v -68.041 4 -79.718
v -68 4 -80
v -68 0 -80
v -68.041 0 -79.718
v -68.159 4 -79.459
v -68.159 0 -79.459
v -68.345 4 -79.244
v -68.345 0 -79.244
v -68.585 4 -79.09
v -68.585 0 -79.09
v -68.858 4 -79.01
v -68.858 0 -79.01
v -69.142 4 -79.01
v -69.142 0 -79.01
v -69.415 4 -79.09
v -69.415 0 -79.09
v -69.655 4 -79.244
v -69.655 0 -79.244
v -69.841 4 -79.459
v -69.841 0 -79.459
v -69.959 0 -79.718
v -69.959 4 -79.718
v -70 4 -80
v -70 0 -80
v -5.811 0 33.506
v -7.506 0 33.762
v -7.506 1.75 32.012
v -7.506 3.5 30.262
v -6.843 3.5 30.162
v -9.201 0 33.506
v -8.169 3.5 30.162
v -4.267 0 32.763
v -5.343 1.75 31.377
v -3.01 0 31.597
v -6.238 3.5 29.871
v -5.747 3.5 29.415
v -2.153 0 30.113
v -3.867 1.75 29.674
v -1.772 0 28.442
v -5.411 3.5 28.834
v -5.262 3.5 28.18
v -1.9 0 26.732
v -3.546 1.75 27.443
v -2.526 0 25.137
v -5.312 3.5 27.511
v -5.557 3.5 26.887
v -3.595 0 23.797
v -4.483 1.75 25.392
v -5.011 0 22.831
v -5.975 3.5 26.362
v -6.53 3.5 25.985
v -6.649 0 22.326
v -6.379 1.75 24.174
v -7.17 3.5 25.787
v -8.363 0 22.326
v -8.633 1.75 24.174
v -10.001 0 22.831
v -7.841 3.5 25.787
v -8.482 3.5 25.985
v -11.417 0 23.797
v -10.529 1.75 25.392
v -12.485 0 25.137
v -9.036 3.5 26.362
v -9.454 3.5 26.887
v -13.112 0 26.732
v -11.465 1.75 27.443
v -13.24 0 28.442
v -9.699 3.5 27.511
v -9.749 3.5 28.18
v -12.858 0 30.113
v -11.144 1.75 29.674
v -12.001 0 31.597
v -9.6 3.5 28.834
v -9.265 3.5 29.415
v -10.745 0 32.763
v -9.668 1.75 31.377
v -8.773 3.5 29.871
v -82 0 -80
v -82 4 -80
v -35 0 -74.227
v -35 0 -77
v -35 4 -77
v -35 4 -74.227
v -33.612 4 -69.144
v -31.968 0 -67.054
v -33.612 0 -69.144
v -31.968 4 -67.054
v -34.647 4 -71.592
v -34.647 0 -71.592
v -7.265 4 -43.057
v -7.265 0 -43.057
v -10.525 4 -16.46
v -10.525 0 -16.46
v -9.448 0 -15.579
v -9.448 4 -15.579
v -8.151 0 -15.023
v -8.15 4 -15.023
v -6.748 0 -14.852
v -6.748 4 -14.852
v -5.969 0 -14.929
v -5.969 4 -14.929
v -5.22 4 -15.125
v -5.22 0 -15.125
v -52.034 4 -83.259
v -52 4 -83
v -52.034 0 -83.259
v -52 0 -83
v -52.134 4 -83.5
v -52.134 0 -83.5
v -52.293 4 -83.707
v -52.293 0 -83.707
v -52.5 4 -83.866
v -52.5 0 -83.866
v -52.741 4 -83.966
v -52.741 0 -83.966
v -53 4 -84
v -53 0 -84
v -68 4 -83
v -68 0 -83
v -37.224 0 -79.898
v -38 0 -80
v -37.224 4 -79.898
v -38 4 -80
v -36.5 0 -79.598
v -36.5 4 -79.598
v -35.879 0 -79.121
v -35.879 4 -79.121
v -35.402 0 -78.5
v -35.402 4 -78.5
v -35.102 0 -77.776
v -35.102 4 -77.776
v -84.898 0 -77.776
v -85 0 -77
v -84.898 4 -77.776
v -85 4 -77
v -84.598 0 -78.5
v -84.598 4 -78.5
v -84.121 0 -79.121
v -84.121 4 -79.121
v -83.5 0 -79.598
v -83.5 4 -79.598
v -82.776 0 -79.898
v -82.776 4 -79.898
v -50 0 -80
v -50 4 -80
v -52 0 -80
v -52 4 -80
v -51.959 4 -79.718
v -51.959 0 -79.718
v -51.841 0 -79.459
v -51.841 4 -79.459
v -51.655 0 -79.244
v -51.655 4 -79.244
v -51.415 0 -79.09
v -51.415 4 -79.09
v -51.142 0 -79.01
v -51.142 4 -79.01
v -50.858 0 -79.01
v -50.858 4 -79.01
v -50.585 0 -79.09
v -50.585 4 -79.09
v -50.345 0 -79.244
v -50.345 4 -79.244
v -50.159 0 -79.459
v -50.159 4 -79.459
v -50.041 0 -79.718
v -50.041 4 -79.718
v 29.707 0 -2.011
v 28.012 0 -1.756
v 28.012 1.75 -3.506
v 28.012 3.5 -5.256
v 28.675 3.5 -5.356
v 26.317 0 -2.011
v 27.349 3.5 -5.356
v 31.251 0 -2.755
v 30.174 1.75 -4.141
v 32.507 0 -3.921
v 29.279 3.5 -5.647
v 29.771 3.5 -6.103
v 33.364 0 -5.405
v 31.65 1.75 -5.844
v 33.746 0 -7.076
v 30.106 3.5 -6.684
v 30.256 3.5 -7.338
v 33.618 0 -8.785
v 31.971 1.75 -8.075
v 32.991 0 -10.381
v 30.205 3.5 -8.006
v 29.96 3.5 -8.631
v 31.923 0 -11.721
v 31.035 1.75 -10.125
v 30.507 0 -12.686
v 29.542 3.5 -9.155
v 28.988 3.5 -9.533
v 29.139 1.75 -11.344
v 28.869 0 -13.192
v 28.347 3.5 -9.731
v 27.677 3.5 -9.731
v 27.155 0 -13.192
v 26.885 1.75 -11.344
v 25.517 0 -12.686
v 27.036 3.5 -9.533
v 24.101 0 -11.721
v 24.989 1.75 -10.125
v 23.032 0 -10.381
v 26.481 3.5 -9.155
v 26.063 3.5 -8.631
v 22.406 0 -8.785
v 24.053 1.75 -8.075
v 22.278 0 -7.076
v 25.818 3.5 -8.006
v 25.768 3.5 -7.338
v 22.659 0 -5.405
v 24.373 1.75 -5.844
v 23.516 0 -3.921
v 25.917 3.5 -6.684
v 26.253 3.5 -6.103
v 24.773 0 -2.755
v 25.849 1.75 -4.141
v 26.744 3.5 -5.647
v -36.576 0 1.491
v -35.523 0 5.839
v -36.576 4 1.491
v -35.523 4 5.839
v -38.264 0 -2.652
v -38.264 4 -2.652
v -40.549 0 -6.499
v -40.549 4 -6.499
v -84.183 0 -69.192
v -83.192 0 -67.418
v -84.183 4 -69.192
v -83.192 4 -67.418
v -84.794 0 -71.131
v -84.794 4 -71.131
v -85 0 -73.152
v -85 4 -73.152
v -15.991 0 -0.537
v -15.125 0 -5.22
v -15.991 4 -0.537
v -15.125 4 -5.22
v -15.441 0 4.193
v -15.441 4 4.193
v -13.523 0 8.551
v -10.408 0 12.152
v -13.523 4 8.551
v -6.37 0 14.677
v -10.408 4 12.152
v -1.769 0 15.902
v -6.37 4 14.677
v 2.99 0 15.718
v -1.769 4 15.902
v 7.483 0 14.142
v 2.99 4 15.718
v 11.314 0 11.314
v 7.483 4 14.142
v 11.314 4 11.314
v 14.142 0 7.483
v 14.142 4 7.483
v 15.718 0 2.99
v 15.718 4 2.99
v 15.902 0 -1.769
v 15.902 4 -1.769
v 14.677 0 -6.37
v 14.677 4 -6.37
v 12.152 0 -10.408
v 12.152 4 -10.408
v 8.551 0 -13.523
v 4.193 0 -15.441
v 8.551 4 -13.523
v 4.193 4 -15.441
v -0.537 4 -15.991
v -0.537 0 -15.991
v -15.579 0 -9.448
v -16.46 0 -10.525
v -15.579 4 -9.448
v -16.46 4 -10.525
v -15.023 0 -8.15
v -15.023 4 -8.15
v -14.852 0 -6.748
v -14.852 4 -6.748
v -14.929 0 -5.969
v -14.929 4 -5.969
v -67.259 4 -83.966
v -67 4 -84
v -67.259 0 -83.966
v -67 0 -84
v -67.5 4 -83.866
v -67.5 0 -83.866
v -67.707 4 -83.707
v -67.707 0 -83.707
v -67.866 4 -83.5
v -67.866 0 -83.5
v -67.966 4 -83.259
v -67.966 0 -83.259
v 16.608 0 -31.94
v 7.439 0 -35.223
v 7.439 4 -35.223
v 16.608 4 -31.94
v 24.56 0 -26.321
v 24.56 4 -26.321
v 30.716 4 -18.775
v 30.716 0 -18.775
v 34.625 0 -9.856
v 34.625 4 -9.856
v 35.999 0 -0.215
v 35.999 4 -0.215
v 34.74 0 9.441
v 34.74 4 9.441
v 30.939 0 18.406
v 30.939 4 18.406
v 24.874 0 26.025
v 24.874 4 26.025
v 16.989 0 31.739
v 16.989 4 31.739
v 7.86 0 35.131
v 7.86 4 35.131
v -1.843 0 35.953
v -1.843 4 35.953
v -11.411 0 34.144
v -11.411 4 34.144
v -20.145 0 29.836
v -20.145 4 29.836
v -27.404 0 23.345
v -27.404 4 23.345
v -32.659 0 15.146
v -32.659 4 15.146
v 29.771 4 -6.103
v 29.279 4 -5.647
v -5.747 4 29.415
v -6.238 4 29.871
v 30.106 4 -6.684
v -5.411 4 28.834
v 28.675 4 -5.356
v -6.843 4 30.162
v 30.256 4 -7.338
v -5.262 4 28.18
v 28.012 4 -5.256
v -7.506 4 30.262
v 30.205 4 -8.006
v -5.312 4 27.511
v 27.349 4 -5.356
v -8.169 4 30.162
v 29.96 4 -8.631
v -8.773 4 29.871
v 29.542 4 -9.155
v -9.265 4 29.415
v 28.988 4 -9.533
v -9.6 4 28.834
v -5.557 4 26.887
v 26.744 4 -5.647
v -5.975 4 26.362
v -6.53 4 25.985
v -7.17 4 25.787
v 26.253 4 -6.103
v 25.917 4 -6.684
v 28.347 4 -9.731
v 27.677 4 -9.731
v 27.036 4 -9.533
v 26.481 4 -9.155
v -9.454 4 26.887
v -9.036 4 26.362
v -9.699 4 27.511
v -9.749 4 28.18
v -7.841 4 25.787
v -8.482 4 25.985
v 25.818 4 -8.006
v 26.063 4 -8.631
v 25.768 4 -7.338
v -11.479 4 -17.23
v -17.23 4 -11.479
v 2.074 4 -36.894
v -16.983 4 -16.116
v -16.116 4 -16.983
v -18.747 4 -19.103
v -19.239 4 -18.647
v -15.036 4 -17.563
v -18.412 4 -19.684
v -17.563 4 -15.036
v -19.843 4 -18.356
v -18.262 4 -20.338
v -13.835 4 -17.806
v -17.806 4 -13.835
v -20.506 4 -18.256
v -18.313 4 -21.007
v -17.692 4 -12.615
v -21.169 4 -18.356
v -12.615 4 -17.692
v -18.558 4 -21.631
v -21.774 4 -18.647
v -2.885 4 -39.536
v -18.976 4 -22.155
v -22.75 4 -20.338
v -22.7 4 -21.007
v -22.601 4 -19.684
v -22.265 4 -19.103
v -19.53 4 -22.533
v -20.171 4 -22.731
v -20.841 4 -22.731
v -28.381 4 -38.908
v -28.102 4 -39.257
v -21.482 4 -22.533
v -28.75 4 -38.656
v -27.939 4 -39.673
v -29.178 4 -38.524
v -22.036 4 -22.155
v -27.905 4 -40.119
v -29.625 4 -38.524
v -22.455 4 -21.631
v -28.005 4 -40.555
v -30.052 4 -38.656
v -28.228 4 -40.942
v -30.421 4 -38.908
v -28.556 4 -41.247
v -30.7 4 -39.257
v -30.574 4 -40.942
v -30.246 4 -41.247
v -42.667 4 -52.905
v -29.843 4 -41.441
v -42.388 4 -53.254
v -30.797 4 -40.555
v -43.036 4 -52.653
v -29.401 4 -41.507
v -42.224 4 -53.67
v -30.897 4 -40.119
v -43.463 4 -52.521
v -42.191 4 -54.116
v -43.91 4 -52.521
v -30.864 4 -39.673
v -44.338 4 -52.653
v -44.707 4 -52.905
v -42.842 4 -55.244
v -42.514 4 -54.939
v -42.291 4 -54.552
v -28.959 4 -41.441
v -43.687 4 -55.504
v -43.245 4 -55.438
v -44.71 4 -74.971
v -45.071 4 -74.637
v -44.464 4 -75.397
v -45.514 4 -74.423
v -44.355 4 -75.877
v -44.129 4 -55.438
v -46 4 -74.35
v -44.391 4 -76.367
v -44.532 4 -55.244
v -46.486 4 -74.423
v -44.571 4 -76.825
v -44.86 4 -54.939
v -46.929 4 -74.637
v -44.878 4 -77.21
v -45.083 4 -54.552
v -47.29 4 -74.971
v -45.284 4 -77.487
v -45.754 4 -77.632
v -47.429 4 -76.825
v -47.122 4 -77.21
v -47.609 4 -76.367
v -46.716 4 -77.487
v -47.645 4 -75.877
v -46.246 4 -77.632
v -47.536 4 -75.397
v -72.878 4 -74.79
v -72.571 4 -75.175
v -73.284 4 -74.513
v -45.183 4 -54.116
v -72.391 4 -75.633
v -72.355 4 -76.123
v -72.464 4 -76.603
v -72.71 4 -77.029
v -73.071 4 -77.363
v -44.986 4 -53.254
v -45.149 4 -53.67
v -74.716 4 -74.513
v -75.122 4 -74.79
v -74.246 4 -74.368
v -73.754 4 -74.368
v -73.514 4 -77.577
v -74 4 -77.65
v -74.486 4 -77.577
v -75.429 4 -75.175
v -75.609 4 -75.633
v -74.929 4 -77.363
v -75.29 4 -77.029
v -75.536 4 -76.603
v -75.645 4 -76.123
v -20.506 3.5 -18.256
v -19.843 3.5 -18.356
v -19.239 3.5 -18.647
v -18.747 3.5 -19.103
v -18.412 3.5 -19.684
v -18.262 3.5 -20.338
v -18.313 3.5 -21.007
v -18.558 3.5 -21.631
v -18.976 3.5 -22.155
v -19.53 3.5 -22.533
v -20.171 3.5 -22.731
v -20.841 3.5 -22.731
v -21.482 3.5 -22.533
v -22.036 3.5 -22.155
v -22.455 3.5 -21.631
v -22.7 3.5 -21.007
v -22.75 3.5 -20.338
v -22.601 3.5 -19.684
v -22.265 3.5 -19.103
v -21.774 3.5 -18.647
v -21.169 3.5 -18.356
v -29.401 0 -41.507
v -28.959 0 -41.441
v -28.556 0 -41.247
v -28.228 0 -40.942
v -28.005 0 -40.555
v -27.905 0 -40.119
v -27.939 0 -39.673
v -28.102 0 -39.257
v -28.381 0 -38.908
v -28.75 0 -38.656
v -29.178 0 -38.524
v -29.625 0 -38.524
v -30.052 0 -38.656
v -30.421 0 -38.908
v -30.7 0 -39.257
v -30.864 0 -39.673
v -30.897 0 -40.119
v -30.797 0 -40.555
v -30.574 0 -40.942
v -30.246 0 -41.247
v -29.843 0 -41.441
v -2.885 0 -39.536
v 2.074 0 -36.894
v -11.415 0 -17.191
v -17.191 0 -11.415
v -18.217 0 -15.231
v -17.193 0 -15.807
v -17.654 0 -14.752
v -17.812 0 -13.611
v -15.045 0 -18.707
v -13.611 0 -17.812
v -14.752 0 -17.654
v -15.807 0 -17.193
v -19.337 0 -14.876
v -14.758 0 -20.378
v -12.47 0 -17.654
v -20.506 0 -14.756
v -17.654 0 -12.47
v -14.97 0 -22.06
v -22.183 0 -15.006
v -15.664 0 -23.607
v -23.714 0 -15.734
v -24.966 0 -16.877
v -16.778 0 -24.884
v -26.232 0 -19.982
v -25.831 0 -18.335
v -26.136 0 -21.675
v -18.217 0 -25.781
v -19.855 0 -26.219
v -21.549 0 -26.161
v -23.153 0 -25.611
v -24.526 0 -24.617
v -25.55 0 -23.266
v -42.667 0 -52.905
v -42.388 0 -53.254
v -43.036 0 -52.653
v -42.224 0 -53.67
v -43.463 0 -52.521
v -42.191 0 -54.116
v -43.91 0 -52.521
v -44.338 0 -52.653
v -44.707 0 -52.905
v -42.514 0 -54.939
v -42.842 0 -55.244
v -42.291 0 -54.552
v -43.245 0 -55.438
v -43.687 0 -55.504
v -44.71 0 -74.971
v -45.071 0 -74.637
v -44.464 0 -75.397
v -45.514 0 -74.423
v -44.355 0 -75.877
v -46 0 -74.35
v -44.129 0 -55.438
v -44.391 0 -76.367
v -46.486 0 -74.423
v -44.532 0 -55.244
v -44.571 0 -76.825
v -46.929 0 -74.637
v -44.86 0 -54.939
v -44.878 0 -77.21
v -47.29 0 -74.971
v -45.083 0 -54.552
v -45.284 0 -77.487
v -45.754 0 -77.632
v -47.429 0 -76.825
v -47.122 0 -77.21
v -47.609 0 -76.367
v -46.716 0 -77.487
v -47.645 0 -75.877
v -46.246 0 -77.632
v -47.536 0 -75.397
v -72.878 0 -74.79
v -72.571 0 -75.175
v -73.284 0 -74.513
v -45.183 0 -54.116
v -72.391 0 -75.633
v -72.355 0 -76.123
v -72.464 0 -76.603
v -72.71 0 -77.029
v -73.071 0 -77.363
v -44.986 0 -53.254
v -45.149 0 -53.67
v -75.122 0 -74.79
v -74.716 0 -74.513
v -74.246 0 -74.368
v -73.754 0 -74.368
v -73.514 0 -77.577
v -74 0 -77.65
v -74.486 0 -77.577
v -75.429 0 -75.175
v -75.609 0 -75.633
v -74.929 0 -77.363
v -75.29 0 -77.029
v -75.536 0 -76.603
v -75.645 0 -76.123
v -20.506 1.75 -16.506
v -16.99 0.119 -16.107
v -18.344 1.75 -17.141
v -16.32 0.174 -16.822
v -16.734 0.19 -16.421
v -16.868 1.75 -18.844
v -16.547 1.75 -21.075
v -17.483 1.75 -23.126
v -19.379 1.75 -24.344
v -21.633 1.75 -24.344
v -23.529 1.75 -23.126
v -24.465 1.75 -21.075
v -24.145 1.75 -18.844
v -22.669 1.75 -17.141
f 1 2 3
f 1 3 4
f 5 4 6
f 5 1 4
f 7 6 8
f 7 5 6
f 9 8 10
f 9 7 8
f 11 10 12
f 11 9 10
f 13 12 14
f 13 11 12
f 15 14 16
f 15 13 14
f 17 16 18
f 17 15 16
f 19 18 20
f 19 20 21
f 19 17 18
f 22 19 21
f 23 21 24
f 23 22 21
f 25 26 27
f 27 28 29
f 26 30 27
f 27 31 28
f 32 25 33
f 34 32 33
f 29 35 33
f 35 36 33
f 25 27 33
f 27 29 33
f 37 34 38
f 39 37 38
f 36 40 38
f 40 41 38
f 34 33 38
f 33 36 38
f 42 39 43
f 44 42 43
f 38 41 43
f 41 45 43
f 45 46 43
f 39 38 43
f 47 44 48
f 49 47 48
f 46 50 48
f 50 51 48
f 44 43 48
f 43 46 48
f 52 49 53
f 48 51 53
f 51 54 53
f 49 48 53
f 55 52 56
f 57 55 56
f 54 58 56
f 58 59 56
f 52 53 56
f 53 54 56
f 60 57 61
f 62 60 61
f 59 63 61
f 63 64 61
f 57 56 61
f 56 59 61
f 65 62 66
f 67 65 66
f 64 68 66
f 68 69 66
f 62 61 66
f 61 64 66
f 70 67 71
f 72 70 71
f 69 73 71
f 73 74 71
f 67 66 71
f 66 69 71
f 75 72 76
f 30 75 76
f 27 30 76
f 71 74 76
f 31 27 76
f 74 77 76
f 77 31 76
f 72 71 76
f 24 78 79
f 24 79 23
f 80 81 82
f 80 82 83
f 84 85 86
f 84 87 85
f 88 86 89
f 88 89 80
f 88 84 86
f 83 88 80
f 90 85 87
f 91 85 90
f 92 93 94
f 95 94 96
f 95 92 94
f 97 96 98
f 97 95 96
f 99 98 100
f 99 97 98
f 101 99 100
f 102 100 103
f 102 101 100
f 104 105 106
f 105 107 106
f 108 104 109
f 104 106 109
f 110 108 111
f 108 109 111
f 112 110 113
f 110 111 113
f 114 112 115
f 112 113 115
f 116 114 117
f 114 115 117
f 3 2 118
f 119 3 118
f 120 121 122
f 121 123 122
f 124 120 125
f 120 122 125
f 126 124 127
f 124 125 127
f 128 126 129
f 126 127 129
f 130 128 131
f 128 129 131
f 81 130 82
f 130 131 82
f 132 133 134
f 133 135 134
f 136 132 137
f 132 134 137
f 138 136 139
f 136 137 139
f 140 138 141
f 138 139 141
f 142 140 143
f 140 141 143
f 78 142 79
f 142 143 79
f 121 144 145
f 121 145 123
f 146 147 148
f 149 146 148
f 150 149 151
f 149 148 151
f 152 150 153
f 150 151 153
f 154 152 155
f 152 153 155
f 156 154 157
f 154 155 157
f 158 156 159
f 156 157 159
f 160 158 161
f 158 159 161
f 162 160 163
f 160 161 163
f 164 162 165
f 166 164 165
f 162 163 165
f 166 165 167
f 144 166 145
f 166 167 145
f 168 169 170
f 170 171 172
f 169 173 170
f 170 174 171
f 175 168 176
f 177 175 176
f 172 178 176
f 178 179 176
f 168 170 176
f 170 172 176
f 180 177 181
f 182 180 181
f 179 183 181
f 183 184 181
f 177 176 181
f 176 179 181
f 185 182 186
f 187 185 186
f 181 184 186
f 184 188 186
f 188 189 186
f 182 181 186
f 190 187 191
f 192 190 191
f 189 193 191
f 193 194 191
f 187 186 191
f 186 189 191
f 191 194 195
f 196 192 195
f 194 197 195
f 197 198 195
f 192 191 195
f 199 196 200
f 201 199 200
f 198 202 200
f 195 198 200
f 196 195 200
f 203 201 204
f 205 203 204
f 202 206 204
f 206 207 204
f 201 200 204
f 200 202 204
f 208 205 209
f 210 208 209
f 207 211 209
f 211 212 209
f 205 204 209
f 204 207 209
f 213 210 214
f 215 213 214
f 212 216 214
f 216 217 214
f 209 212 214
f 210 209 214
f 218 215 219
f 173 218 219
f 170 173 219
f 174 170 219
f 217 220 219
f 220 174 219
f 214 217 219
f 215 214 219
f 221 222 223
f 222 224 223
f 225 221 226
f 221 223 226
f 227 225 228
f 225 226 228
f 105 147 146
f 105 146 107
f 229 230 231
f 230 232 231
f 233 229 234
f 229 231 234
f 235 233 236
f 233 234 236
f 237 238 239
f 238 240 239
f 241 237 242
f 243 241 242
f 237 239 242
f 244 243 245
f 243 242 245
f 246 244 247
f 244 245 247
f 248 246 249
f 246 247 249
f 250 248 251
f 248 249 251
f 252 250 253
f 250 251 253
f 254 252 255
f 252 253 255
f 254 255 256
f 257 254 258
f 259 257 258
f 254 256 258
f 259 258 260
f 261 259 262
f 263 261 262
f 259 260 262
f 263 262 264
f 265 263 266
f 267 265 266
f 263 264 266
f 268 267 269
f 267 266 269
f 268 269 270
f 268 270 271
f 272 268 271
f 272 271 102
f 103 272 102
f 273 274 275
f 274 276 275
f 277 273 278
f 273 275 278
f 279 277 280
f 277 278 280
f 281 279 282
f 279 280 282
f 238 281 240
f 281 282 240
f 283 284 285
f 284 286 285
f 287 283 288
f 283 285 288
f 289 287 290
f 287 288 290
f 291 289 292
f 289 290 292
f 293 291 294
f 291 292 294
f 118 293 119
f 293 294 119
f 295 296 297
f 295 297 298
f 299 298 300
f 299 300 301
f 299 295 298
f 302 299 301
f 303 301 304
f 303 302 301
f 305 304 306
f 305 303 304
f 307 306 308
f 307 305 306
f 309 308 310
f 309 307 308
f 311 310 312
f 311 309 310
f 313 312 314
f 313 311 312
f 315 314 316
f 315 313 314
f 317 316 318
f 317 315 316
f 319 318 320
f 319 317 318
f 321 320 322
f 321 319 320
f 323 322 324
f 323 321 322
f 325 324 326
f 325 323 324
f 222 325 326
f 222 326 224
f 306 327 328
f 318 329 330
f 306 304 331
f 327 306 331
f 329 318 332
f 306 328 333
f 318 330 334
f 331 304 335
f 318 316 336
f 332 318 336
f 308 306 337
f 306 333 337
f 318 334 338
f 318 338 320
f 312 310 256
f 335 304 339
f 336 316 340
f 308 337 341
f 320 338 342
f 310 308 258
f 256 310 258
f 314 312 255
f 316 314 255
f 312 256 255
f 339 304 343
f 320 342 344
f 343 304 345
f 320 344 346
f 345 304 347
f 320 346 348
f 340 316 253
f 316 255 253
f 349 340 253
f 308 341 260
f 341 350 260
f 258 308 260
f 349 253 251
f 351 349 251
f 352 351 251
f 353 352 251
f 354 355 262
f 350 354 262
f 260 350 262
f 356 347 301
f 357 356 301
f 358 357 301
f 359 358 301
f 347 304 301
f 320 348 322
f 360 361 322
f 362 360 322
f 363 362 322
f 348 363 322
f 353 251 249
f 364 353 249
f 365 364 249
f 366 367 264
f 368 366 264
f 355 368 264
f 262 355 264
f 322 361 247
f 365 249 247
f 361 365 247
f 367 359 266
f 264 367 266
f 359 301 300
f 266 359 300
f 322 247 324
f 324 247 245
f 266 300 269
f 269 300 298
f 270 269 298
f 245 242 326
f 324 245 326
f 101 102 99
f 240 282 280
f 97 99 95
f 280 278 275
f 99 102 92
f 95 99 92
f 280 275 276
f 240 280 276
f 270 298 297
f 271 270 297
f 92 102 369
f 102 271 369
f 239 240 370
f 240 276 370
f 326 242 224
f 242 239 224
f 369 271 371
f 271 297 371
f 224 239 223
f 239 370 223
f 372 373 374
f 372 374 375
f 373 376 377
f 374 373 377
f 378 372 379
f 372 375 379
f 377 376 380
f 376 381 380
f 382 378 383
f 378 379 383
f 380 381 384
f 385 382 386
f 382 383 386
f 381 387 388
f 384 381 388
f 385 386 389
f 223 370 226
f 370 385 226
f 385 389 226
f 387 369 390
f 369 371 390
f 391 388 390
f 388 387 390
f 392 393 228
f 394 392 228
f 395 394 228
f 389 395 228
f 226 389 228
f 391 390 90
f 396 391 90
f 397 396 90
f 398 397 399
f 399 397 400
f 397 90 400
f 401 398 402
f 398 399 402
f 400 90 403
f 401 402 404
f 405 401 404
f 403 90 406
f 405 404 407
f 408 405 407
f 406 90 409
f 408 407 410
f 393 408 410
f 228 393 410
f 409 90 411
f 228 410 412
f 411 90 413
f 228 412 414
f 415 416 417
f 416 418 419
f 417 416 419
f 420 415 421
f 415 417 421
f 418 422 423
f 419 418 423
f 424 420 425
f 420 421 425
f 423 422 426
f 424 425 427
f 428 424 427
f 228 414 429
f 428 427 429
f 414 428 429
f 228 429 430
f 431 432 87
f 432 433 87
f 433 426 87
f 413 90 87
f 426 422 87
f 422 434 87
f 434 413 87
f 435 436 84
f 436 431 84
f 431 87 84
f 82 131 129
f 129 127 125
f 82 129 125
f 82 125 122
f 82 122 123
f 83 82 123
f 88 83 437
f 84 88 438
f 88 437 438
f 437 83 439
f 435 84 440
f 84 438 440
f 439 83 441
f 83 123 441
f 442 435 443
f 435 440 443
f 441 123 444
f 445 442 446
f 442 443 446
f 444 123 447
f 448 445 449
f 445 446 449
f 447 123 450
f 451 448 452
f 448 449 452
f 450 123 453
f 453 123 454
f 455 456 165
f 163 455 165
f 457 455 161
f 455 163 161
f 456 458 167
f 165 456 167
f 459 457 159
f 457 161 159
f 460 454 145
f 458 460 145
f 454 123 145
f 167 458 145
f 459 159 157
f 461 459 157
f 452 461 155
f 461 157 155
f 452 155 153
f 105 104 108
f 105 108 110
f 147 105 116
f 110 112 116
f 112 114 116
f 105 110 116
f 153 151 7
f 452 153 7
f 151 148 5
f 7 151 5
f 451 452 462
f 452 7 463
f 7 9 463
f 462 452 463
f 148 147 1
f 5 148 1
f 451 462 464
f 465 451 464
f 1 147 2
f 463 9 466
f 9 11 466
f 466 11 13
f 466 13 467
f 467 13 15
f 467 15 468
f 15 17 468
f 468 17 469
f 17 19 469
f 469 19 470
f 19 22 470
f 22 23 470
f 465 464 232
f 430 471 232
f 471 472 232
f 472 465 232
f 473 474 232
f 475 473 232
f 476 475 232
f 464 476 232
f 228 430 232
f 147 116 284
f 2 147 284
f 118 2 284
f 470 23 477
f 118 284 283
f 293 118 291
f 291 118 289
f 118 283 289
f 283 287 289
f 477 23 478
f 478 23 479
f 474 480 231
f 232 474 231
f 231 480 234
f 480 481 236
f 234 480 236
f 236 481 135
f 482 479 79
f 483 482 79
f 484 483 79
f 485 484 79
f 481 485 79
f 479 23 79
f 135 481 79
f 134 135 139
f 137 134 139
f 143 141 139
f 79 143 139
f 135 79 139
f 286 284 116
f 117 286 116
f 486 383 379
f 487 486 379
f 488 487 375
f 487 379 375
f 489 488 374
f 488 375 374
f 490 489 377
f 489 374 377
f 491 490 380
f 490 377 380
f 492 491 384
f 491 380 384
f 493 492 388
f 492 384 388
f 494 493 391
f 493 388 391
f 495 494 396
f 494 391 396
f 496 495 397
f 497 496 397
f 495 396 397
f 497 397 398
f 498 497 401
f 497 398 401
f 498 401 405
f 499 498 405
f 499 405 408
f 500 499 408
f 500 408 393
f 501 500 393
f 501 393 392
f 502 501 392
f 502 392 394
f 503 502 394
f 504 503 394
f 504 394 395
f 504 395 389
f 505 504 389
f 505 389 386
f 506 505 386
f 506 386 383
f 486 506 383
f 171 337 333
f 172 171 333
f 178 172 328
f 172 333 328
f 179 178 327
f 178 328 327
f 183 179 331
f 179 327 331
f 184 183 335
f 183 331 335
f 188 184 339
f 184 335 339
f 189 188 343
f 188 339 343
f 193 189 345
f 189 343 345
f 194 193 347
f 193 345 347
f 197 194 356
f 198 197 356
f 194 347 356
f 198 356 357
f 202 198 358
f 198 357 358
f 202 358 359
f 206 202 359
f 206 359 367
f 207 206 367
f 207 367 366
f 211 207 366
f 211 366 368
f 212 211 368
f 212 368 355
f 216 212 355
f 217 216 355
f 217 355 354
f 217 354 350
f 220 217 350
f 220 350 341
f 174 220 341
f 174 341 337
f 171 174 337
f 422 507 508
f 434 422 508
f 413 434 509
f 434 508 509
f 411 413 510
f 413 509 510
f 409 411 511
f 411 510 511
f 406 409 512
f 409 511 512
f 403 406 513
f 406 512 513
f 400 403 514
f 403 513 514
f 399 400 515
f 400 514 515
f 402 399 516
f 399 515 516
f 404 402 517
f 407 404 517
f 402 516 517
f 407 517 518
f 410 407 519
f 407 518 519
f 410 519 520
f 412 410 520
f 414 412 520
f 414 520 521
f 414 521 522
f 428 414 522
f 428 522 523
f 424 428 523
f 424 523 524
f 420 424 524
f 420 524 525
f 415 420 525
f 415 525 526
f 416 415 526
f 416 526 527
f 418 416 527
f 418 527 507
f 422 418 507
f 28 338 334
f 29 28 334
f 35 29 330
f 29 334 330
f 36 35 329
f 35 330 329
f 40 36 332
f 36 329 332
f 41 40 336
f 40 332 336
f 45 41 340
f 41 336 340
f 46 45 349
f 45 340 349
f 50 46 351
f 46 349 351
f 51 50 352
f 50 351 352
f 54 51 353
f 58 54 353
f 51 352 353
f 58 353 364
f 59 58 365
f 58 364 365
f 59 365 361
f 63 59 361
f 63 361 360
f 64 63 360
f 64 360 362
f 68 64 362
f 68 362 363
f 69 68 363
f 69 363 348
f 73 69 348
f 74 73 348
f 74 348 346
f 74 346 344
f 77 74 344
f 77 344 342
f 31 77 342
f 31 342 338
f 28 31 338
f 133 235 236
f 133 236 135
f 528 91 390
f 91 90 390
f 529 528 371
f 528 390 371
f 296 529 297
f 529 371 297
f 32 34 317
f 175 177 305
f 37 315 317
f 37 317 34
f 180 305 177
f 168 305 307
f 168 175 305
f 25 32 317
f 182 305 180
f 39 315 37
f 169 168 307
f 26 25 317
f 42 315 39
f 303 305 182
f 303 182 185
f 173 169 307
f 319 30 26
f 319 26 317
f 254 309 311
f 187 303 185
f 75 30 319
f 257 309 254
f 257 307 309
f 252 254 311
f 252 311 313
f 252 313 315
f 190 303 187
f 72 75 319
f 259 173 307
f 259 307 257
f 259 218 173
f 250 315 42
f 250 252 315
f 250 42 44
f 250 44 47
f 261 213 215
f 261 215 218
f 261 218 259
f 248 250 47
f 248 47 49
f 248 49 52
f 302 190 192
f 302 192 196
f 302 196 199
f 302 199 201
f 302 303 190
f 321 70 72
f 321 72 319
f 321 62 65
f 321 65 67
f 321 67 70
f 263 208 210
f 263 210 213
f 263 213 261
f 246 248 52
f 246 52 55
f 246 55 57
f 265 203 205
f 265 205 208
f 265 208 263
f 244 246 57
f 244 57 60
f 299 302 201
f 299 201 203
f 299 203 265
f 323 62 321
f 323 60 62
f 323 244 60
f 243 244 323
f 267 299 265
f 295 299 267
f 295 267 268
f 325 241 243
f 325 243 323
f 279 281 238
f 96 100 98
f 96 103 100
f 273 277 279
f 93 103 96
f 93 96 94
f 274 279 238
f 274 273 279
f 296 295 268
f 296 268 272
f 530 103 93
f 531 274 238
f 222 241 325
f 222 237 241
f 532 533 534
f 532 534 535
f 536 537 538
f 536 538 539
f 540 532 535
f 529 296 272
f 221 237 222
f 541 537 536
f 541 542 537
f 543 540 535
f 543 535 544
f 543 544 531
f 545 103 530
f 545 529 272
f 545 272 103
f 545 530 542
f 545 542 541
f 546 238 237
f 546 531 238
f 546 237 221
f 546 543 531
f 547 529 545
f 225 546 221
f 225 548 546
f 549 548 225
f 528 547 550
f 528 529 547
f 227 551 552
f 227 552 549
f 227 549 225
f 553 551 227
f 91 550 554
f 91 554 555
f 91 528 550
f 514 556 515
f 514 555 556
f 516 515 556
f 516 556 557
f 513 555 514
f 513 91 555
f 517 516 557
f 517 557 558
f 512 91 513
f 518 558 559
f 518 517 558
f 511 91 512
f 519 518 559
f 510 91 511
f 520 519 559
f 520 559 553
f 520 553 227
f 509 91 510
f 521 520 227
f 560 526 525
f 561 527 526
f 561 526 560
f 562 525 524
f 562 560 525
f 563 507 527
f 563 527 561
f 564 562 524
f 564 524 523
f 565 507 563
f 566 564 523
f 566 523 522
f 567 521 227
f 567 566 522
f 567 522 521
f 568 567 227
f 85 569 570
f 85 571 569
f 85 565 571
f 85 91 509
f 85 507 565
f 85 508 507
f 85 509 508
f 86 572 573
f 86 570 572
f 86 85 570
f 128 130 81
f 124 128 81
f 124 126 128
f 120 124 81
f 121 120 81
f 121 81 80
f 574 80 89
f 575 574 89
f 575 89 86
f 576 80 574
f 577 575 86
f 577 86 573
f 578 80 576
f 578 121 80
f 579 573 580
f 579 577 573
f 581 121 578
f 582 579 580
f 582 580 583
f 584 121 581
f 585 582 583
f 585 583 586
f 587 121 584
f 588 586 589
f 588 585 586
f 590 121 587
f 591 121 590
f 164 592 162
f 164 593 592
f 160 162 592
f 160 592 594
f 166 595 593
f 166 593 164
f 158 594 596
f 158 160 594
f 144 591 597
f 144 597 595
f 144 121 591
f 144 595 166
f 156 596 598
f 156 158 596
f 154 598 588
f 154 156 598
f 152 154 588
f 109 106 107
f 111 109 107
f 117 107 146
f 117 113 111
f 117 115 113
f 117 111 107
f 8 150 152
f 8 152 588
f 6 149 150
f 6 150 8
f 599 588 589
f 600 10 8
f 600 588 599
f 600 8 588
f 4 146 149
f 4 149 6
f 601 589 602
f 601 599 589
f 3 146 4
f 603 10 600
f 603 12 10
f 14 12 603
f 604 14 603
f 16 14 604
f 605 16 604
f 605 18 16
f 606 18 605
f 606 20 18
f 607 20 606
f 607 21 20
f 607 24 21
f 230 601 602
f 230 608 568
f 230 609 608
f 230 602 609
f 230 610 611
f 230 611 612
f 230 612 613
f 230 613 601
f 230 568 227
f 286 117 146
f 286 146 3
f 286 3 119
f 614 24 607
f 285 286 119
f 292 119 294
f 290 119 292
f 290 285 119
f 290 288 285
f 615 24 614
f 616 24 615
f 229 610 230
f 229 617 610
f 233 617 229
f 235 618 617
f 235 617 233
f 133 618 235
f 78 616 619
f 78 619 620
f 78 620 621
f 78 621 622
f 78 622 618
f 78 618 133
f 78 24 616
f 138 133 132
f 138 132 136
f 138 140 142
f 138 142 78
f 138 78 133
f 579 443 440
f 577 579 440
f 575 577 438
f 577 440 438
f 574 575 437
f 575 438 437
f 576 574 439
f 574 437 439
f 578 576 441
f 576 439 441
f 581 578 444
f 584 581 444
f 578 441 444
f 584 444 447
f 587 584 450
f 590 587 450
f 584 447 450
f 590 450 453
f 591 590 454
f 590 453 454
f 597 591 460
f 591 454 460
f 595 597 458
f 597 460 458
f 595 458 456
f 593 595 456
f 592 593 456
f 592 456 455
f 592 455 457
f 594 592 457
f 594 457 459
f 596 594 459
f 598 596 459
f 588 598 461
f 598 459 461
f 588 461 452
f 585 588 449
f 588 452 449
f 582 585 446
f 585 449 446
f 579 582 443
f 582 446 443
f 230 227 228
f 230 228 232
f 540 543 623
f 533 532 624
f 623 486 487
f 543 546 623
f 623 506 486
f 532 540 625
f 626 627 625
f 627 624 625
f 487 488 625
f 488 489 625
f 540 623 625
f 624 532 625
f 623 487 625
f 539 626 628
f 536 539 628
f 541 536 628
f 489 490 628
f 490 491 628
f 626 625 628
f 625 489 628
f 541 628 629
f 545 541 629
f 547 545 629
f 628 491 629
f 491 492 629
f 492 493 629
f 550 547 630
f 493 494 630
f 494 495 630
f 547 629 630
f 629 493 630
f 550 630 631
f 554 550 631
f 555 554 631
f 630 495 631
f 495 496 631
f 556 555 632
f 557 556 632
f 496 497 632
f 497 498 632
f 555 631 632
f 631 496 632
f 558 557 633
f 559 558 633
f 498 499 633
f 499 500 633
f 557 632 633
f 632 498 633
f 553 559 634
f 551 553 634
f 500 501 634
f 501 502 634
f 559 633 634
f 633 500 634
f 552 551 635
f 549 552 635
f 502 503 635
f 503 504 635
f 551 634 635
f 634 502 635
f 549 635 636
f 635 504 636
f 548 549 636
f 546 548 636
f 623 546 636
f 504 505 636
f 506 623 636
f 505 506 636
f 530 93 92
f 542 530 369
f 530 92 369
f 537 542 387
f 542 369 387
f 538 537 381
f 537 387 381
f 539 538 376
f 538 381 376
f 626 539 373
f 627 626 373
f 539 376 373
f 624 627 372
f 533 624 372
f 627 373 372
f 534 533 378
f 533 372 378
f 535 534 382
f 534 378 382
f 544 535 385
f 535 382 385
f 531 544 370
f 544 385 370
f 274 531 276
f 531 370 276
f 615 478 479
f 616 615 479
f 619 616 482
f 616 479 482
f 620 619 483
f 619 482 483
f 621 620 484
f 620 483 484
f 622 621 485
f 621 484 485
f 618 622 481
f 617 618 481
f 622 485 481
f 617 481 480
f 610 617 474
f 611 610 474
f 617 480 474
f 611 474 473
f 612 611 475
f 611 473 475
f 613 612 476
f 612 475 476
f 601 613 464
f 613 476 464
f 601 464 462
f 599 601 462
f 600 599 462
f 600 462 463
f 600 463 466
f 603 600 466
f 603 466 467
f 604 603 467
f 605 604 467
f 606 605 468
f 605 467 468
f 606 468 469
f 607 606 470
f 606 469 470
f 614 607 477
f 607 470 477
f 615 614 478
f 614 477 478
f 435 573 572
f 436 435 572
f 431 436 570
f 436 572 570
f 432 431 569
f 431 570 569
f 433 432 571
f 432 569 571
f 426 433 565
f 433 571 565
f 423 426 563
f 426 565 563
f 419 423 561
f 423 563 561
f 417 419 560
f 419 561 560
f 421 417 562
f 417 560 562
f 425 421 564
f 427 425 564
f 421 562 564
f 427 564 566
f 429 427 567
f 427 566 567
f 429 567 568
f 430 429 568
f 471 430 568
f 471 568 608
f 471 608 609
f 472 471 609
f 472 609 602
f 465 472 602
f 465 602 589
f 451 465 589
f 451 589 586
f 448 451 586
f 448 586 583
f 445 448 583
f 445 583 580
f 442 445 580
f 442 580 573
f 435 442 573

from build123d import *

# Parameters (mm, degrees)
EXTRUDE_1_DEPTH     = 4
FILLET_1_R          = 30
FILLET_2_R          = 30
SKETCH_2_R          = 2.25
SKETCH_2_R_2        = 16
CUT_EXTRUDE_1_DEPTH = 4
SKETCH_3_R          = 4.2
CUT_EXTRUDE_2_DEPTH = 4
FILLET_3_R          = 5
SKETCH_4_R          = 1.65
CUT_EXTRUDE_3_DEPTH = 4
FILLET_4_R          = 10
FILLET_5_R          = 3
SKETCH_7_W          = 16
SKETCH_7_H          = 4
EXTRUDE_3_DEPTH     = 4
CUT_EXTRUDE_5_DEPTH = 4
FILLET_7_R          = 1
CHAMFER_1_SIZE      = 3.5
SKETCH_9_R          = 1.2
CUT_EXTRUDE_6_DEPTH = 10
SKETCH_10_R         = 1.5
CUT_EXTRUDE_7_DEPTH = 10


with BuildPart() as part:
    # 草图1 → 凸台-拉伸1 (new body)
    with BuildSketch(Plane(origin=(0, 0, 0), x_dir=(1, 0, 0), z_dir=(0, 1, 0))):
        with BuildLine():
            Line((-85, 80), (-35, 80))
            Line((-35, 80), (-35, 70))
            Line((-35, 70), (0, 36))
            ThreePointArc((0, 36), (25.455844123, -25.455844123), (-36, 0))
            Line((-36, 0), (-85, 70))
            Line((-85, 70), (-85, 80))
        make_face()
    extrude(amount=EXTRUDE_1_DEPTH)

    # 圆角1
    fillet_1_edges = [part.edges().sort_by_distance(p)[0] for p in [
        (0, 2, -36),
    ]]
    fillet(fillet_1_edges, radius=FILLET_1_R)

    # 圆角2
    fillet_2_edges = [part.edges().sort_by_distance(p)[0] for p in [
        (-36, 2, 0),
    ]]
    fillet(fillet_2_edges, radius=FILLET_2_R)

    # 草图2 → 切除-拉伸1 (cut)
    with BuildSketch(Plane(origin=(0, 4, 0), x_dir=(1, 0, 0), z_dir=(0, 1, 0))):
        with Locations(Location((-20.506096654, 20.506096654, 0), (0, 0, 270))):
            Circle(SKETCH_2_R)
        with Locations(Location((28.011848962, 7.505752308, 0), (0, 0, 270))):
            Circle(SKETCH_2_R)
        with Locations(Location((-7.505752308, -28.011848962, 0), (0, 0, 270))):
            Circle(SKETCH_2_R)
        with Locations(Location((0, 0, 0), (0, 0, 270))):
            Circle(SKETCH_2_R_2)
    extrude(amount=-CUT_EXTRUDE_1_DEPTH, mode=Mode.SUBTRACT)

    # 草图3 → 切除-拉伸2 (cut)
    with BuildSketch(Plane(origin=(0, 4, 0), x_dir=(1, 0, 0), z_dir=(0, 1, 0))):
        with Locations((-13.611805538, 13.611805538)):
            Circle(SKETCH_3_R)
    extrude(amount=-CUT_EXTRUDE_2_DEPTH, mode=Mode.SUBTRACT)

    # 圆角3
    fillet_3_edges = [part.edges().sort_by_distance(p)[0] for p in [
        (-9.473632004, 2, -12.893808462),
        (-12.893808462, 2, -9.473632004),
    ]]
    fillet(fillet_3_edges, radius=FILLET_3_R)

    # 草图4 → 切除-拉伸3 (cut)
    with BuildSketch(Plane(origin=(0, 4, 0), x_dir=(1, 0, 0), z_dir=(0, 1, 0))):
        with Locations(Location((-46, 76, 0), (0, 0, 270))):
            Circle(SKETCH_4_R)
        with Locations(Location((-74, 76, 0), (0, 0, 90))):
            Circle(SKETCH_4_R)
    extrude(amount=-CUT_EXTRUDE_3_DEPTH, mode=Mode.SUBTRACT)

    # 圆角4
    fillet_4_edges = [part.edges().sort_by_distance(p)[0] for p in [
        (-35, 2, -70),
        (-85, 2, -70),
    ]]
    fillet(fillet_4_edges, radius=FILLET_4_R)

    # 圆角5
    fillet_5_edges = [part.edges().sort_by_distance(p)[0] for p in [
        (-85, 2, -80),
        (-35, 2, -80),
    ]]
    fillet(fillet_5_edges, radius=FILLET_5_R)

    # 草图7 → 凸台-拉伸3 (add)
    with BuildSketch(Plane(origin=(0, 4, 0), x_dir=(1, 0, 0), z_dir=(0, 1, 0))):
        with Locations((-60, 82)):
            Rectangle(SKETCH_7_W, SKETCH_7_H)
    extrude(amount=-EXTRUDE_3_DEPTH)

    # 草图8 → 切除-拉伸5 (cut)
    with BuildSketch(Plane(origin=(0, 4, 0), x_dir=(1, 0, 0), z_dir=(0, 1, 0))):
        with BuildLine():
            Line((-50, 80), (-52, 80))
            ThreePointArc((-52, 80), (-51, 79), (-50, 80))
        make_face()
        with BuildLine():
            Line((-70, 80), (-68, 80))
            ThreePointArc((-68, 80), (-69, 79), (-70, 80))
        make_face()
    extrude(amount=-CUT_EXTRUDE_5_DEPTH, mode=Mode.SUBTRACT)

    # 圆角7
    fillet_7_edges = [part.edges().sort_by_distance(p)[0] for p in [
        (-52, 2, -84),
        (-68, 2, -84),
    ]]
    fillet(fillet_7_edges, radius=FILLET_7_R)

    # 倒角1
    # the kernel refuses this chamfer: 3.5 mm, written as the material it takes off along each edge
    with BuildSketch(Plane(origin=(-20.506096654, 0, -20.506096654), x_dir=(0, 0, 1), z_dir=(-1, 0, 0))) as chamfer_1_piece_1:
        Polygon((2.25 + CHAMFER_1_SIZE, 0), (2.25, CHAMFER_1_SIZE), (2.25, 0), align=None)
    revolve(axis=Axis((-20.506096654, 0, -20.506096654), (0, 1, 0)), mode=Mode.SUBTRACT)
    with BuildSketch(Plane(origin=(28.011848962, 0, -7.505752308), x_dir=(0, 0, 1), z_dir=(-1, 0, 0))) as chamfer_1_piece_2:
        Polygon((2.25 + CHAMFER_1_SIZE, 0), (2.25, CHAMFER_1_SIZE), (2.25, 0), align=None)
    revolve(axis=Axis((28.011848962, 0, -7.505752308), (0, 1, 0)), mode=Mode.SUBTRACT)
    with BuildSketch(Plane(origin=(-7.505752308, 0, 28.011848962), x_dir=(0, 0, 1), z_dir=(-1, 0, 0))) as chamfer_1_piece_3:
        Polygon((2.25 + CHAMFER_1_SIZE, 0), (2.25, CHAMFER_1_SIZE), (2.25, 0), align=None)
    revolve(axis=Axis((-7.505752308, 0, 28.011848962), (0, 1, 0)), mode=Mode.SUBTRACT)

    # 草图9 → 切除-拉伸6 (cut)
    with BuildSketch(Plane.XZ):
        with Locations(Location((-29.401166302, -40.007142113, 0), (0, 0, 270))):
            Circle(SKETCH_9_R)
        with Locations(Location((-43.686880588, -54.004226358, 0), (0, 0, 270))):
            Circle(SKETCH_9_R)
    extrude(amount=-CUT_EXTRUDE_6_DEPTH, mode=Mode.SUBTRACT)

    # 草图10 → 切除-拉伸7 (cut)
    with BuildSketch(Plane.XZ):
        with Locations(Location((-29.401166302, -40.007142113, 0), (0, 0, 270))):
            Circle(SKETCH_10_R)
        with Locations(Location((-43.686880588, -54.004226358, 0), (0, 0, 270))):
            Circle(SKETCH_10_R)
    extrude(amount=-CUT_EXTRUDE_7_DEPTH, mode=Mode.SUBTRACT)


solid = part.part
